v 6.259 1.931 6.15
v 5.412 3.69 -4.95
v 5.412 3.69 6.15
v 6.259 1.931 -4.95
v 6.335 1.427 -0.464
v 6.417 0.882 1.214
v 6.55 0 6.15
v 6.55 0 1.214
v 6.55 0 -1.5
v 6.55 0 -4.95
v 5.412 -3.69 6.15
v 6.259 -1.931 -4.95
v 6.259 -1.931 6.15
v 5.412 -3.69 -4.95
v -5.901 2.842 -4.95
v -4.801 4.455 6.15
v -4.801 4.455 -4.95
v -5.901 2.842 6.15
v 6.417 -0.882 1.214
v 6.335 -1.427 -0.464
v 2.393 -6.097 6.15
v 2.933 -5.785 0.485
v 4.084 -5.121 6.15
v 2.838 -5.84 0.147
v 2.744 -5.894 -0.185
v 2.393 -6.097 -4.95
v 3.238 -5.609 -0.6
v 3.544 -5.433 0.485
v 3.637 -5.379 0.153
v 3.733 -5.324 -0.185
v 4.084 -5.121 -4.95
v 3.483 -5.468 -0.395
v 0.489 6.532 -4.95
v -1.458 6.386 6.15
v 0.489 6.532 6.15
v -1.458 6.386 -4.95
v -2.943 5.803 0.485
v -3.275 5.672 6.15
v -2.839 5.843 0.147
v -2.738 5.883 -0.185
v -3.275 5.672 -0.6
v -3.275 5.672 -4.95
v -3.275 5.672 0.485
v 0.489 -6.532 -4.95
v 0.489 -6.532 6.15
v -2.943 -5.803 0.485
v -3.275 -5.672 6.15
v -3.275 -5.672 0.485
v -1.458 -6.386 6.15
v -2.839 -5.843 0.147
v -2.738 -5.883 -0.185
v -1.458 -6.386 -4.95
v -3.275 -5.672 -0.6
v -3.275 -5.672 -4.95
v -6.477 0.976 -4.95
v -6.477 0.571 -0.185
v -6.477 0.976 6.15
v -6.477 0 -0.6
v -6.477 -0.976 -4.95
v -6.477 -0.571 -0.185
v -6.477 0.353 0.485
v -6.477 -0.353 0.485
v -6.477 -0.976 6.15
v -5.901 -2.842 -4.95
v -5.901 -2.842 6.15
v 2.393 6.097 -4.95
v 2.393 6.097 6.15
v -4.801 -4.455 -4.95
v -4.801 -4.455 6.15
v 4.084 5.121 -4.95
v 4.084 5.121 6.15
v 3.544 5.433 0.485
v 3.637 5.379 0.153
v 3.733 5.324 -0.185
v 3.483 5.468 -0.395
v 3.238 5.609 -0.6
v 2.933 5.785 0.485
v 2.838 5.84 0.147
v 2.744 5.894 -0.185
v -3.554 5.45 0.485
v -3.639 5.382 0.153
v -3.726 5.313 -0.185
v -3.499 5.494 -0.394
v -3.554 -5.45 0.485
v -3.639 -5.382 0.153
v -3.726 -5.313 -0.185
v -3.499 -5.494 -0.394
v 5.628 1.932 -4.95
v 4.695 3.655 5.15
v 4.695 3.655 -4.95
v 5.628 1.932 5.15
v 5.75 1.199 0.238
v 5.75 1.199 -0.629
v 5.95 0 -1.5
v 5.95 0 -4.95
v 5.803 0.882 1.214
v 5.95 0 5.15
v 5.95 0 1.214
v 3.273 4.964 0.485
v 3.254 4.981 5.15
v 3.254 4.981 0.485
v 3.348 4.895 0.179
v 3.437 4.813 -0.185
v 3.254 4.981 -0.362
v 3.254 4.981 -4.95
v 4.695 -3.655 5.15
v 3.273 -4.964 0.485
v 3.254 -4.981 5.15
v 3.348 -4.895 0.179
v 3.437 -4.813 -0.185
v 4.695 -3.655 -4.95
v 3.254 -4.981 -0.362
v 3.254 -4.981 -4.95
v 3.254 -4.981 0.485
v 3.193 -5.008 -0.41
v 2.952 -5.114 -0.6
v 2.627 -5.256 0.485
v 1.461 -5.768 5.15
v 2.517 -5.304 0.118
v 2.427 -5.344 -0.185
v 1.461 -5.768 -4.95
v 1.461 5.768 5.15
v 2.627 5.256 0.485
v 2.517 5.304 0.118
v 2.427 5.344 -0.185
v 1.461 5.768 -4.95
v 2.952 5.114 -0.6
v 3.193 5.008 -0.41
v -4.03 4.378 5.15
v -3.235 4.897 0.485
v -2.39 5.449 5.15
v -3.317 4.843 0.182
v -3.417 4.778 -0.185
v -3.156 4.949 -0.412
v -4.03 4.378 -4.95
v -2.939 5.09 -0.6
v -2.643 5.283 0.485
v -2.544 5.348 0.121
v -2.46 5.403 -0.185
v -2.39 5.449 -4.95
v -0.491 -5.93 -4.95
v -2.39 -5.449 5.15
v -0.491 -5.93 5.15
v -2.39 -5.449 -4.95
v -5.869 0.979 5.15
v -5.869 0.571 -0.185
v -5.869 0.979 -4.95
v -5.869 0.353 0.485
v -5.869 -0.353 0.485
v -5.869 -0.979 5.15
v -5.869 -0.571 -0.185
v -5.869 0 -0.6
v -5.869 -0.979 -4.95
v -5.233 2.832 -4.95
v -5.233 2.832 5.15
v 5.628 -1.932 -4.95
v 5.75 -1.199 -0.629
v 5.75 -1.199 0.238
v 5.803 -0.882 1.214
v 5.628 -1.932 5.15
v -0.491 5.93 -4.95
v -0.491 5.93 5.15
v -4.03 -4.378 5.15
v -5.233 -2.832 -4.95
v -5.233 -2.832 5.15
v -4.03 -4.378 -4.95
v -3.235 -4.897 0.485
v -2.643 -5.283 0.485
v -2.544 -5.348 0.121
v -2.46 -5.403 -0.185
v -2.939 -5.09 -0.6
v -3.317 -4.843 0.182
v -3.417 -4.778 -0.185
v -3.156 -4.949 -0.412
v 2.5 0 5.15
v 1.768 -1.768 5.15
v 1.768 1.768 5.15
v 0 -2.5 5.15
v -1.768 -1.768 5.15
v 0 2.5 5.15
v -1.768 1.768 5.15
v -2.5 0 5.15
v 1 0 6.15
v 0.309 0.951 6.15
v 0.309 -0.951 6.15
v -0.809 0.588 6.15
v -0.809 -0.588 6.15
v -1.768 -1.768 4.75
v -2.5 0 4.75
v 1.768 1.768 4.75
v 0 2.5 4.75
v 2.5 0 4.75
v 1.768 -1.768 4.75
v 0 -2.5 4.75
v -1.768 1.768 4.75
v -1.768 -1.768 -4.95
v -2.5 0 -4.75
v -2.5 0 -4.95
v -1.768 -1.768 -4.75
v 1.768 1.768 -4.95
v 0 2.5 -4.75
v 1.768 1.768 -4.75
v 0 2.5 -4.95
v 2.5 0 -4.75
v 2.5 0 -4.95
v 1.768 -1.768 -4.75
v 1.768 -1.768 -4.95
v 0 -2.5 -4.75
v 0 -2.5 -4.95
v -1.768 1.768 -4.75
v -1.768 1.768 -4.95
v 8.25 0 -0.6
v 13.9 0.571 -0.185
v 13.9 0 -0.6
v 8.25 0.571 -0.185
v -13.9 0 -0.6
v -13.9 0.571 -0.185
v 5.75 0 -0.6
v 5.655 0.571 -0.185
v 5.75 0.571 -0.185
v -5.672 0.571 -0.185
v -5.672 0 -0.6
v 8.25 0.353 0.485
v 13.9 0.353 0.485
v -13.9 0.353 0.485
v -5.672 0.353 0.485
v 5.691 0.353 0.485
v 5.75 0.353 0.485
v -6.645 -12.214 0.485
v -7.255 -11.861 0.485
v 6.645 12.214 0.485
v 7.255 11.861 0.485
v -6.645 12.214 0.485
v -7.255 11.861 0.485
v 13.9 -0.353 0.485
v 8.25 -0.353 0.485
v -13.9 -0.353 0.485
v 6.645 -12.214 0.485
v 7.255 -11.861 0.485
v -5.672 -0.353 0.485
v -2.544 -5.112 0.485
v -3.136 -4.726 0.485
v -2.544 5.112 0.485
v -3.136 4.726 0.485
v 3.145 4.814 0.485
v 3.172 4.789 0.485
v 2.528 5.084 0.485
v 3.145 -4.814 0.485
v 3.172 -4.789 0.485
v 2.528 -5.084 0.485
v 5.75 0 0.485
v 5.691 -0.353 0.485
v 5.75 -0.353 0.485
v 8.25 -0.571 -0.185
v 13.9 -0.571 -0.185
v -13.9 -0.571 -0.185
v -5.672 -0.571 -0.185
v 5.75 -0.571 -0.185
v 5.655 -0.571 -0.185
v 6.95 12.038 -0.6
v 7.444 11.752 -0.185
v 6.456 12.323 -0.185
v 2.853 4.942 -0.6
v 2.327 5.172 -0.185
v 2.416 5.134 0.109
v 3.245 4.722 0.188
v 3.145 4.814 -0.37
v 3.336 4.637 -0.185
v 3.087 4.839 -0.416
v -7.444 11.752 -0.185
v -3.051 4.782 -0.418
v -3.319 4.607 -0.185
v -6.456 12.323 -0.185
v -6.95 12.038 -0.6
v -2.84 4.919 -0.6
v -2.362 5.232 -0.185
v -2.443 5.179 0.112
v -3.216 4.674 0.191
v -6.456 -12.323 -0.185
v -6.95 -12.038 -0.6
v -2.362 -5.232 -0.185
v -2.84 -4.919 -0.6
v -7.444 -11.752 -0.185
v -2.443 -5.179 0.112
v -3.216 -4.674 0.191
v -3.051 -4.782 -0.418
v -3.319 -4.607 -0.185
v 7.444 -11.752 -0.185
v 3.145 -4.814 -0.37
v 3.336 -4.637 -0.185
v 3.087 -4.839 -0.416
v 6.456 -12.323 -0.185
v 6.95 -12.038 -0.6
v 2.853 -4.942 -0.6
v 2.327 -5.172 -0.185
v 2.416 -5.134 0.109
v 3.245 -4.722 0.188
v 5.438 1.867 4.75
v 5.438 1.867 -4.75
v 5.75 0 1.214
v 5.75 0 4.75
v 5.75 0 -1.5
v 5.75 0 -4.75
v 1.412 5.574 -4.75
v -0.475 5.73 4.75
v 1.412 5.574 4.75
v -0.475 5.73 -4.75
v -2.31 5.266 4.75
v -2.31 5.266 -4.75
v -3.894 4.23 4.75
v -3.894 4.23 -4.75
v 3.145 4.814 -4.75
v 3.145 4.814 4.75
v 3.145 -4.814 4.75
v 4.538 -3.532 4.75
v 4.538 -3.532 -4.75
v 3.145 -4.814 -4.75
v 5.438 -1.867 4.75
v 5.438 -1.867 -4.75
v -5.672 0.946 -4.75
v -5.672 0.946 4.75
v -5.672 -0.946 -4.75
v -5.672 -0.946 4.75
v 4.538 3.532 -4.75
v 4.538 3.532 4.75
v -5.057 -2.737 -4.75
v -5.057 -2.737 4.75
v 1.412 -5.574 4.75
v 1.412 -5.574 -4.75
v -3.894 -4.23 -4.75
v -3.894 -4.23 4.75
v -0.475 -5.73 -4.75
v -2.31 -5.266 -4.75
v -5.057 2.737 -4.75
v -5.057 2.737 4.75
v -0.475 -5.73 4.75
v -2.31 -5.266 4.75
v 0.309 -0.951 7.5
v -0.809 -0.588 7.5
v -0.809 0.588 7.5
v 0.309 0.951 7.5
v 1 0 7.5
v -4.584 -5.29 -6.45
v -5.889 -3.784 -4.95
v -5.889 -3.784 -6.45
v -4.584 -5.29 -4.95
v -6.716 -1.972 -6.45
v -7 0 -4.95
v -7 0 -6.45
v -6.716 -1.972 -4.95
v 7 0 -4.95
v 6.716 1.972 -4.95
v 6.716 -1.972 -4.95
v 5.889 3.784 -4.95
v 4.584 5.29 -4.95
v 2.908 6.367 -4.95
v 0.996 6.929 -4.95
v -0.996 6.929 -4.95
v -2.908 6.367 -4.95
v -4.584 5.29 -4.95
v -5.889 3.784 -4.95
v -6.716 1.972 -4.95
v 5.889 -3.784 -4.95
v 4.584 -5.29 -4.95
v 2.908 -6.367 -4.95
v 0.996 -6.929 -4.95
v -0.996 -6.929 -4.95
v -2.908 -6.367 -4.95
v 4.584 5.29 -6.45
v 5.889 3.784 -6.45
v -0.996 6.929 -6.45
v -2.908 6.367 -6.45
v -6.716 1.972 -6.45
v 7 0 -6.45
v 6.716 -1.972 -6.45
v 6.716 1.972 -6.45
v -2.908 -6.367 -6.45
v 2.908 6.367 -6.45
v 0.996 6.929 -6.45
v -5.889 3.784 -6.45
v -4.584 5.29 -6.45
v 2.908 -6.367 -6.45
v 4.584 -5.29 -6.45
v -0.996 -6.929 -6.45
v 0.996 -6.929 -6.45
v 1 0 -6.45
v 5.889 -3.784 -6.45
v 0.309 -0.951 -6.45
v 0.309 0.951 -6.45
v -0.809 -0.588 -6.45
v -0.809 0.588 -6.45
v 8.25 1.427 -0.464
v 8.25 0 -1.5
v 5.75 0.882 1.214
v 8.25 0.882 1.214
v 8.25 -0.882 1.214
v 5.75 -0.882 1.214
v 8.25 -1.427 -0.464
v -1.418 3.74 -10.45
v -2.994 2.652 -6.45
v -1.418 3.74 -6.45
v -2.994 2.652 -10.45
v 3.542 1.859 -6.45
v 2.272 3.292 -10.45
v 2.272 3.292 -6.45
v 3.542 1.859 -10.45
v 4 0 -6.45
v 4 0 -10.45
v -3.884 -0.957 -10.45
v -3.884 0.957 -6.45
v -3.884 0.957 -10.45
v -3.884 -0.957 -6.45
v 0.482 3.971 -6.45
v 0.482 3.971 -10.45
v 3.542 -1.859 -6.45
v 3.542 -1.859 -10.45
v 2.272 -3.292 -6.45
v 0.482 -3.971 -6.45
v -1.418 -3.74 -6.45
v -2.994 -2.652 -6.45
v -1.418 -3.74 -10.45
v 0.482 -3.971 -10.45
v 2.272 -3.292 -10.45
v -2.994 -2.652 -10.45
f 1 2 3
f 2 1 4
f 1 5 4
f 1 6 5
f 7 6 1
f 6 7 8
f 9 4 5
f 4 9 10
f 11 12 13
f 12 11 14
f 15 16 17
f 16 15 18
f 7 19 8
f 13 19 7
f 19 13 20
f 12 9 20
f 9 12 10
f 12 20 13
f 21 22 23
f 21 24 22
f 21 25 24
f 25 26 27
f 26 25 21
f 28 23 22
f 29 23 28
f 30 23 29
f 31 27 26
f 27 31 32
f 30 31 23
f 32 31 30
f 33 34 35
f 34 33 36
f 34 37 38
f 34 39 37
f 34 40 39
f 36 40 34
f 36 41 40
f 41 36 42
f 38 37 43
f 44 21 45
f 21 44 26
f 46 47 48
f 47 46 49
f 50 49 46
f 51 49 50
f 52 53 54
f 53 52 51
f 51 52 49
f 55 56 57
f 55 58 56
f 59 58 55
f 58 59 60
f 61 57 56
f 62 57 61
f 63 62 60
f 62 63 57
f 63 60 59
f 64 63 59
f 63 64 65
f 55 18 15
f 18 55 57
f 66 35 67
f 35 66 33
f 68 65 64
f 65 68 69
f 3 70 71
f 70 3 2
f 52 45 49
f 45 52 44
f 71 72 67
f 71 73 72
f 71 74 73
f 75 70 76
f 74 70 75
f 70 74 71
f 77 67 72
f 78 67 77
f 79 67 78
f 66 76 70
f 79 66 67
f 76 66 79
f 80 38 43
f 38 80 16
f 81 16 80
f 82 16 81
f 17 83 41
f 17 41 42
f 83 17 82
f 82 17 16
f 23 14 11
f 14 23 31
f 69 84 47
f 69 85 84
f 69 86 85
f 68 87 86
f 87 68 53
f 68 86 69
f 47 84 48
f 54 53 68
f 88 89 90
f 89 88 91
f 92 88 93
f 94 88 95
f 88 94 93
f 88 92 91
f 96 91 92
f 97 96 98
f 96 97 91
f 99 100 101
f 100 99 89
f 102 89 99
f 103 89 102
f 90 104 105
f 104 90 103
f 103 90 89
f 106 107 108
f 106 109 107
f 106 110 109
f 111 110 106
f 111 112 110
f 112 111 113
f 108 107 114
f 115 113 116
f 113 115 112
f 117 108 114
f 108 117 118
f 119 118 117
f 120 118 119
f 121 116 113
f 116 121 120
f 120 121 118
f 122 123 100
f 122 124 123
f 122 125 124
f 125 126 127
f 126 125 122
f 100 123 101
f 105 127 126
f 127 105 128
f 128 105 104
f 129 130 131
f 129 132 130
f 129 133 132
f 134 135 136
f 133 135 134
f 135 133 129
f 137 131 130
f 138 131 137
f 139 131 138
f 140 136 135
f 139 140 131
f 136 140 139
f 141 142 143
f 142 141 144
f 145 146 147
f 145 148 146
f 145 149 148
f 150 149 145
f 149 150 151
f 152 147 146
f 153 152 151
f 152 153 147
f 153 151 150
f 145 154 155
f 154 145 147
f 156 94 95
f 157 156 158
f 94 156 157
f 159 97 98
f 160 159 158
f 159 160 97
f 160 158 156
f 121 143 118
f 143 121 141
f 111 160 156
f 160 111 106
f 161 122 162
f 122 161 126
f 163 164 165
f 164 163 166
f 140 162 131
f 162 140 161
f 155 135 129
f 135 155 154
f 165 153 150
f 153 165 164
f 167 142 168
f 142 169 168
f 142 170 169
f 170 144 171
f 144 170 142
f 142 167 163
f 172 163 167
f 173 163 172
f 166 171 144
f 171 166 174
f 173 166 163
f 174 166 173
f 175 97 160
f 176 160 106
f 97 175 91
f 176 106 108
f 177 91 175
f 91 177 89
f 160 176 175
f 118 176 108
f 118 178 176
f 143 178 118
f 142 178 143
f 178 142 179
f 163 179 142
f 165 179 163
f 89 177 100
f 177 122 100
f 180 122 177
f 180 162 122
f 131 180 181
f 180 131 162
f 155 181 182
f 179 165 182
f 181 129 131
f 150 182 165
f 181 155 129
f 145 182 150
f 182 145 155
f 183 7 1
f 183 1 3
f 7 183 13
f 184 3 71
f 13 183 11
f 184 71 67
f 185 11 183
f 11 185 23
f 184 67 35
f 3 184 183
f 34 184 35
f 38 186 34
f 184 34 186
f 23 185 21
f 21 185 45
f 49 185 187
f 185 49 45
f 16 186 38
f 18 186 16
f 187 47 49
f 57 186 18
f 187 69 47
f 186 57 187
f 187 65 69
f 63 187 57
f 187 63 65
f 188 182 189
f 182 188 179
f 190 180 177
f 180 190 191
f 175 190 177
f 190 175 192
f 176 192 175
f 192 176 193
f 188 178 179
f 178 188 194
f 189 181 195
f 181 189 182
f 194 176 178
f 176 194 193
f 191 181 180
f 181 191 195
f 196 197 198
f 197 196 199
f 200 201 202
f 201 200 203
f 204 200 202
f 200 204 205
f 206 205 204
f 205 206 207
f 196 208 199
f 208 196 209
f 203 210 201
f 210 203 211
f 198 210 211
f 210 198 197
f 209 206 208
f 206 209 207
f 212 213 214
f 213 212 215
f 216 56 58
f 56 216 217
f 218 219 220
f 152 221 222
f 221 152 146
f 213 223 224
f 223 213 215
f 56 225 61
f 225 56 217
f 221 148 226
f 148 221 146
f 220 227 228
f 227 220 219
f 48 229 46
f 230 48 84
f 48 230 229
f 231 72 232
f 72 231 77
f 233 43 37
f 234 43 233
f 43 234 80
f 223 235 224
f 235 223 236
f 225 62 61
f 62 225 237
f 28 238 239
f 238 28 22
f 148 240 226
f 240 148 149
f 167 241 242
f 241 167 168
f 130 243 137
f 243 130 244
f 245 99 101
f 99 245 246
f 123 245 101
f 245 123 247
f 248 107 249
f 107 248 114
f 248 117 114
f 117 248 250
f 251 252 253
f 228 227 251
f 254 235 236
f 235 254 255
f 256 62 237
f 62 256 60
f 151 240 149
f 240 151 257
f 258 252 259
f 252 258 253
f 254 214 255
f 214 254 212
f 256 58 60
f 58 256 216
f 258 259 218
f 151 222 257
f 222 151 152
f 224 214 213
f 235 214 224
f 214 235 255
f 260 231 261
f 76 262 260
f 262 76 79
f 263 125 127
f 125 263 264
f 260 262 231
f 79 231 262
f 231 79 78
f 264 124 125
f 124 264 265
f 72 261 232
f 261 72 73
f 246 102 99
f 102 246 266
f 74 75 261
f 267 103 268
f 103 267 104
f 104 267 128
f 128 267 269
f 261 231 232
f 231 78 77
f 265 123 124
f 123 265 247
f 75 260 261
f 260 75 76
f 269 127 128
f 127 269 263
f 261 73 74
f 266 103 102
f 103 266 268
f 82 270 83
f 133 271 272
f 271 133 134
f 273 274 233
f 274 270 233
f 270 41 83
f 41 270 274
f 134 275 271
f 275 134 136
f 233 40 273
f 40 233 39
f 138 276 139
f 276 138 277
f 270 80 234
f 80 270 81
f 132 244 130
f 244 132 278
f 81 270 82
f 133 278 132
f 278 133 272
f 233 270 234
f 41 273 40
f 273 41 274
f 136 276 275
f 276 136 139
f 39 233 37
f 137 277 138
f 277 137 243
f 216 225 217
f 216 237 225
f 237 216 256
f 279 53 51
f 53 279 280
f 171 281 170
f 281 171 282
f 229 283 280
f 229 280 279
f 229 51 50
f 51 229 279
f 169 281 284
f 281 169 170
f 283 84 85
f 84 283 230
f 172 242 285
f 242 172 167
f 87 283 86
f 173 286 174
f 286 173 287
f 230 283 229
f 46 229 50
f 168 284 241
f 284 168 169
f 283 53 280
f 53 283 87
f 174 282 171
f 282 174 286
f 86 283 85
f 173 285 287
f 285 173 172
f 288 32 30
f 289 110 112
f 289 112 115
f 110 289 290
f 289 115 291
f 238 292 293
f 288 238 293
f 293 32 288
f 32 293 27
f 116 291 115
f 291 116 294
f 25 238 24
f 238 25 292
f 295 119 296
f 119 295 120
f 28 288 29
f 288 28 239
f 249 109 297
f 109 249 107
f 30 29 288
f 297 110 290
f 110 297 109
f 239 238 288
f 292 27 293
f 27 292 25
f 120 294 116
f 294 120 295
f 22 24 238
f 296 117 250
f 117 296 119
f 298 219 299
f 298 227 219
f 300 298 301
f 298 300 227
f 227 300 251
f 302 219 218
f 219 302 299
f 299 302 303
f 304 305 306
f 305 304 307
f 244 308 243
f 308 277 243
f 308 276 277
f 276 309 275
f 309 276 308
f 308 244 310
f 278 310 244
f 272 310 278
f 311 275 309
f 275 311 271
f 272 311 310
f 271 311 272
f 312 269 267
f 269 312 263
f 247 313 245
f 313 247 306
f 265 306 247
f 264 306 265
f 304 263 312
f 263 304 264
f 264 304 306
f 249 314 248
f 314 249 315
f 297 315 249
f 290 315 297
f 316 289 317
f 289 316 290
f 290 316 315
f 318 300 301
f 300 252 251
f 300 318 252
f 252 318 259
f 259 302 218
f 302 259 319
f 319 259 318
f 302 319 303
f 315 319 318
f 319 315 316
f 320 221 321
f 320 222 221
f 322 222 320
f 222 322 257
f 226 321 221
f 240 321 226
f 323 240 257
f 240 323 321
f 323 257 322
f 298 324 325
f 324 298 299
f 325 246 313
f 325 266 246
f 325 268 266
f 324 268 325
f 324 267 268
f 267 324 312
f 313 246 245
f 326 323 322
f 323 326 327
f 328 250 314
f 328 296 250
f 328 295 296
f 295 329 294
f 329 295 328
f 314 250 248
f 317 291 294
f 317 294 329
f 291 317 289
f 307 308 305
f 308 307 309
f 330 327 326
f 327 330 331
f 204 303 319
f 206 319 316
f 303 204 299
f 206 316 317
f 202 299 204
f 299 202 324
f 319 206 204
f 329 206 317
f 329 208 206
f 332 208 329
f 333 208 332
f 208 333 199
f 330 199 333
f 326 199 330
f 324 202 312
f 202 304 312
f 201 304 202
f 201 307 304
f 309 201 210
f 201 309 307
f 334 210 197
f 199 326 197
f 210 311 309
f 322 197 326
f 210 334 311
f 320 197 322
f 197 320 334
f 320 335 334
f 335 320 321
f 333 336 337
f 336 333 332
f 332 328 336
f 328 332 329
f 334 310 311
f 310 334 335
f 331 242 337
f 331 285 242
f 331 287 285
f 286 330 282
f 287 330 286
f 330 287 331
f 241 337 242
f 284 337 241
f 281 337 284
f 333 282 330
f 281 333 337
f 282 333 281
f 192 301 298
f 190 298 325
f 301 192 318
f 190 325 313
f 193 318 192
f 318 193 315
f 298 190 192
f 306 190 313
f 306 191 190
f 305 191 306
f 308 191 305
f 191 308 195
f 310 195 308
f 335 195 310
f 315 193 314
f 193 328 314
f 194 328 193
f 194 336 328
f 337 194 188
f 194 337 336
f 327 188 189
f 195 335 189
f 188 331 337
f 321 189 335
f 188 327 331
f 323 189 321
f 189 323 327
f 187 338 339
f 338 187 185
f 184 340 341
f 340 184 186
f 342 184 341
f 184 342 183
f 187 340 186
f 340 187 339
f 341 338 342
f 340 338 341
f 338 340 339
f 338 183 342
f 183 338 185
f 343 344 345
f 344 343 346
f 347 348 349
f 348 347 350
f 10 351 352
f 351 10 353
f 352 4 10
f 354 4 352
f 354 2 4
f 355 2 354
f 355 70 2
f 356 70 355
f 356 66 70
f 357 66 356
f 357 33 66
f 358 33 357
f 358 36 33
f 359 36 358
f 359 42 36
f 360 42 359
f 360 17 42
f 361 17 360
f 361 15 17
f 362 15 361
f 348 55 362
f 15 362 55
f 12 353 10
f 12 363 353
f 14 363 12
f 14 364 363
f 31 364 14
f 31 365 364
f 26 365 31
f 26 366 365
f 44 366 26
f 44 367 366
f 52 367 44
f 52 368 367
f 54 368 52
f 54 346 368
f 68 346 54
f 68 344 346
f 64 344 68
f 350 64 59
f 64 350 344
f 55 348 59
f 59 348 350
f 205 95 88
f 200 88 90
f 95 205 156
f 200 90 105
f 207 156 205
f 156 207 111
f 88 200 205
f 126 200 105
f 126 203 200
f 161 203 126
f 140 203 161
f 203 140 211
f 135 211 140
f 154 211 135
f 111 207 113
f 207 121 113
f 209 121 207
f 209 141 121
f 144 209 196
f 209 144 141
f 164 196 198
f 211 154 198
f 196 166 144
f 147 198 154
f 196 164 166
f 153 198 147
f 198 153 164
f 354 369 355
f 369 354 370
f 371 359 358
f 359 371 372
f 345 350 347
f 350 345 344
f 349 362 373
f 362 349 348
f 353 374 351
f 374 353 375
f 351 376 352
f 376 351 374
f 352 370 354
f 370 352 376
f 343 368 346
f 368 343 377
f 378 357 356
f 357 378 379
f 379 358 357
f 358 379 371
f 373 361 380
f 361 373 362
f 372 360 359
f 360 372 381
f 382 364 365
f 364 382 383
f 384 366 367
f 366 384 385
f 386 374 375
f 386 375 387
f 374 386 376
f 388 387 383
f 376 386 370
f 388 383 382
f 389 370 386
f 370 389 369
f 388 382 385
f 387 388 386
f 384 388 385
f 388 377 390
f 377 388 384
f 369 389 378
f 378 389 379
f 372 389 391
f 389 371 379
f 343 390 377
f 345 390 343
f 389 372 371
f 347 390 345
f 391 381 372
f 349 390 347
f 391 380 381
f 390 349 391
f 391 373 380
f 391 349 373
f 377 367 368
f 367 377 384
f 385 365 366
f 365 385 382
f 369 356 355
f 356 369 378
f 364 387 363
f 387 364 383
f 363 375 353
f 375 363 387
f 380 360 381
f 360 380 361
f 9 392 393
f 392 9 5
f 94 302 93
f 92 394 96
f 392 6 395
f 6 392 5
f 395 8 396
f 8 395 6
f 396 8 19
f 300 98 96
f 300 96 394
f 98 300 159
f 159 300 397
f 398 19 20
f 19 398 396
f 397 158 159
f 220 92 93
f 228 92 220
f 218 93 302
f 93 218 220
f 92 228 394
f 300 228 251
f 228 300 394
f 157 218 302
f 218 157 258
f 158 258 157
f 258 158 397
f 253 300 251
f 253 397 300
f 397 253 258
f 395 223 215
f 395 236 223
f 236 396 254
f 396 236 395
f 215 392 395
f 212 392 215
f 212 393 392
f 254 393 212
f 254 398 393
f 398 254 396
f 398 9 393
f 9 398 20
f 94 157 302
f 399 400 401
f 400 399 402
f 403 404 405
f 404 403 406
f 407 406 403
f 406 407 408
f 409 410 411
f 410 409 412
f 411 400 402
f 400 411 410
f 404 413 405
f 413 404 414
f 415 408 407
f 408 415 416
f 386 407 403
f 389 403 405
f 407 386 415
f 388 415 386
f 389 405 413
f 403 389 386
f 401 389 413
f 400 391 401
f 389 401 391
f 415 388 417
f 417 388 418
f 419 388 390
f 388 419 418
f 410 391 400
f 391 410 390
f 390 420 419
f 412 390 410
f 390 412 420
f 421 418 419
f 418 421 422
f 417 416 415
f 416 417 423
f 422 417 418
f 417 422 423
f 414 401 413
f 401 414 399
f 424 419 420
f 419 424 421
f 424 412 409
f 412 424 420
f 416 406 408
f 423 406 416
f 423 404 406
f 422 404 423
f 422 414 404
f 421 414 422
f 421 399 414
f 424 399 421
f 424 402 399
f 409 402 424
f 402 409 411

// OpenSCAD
// Parameters
stator_diameter_mm = 11.5; //[6:23:0.1]
stator_height_mm = 9.5; //[5:19:0.1]
housing_wall_thickness_mm = 0.6; //[0.3:1.2:0.05]
housing_clearance_mm = 0.2; //[0.1:0.6:0.05]
shaft_diameter_mm = 2; //[1:4:0.05]
shaft_length_mm = 15; //[8:30:0.5]
endcap_thickness_mm = 1; //[0.5:2:0.05]
bearing_outer_diameter_mm = 5; //[3:10:0.1]
bearing_thickness_mm = 2; //[1:4:0.1]
flange_diameter_mm = 14; //[8:28:0.1]
flange_thickness_mm = 1.5; //[0.8:3:0.1]
overlap_mm = 0.8; //[0.5:2:0.1]
housing_extra_height_mm = 2; //[0.5:6:0.1]
wire_grommet_diameter_mm = 3; //[1.5:6:0.1]
wire_grommet_length_mm = 2.5; //[1:6:0.1]
vent_hole_diameter_mm = 1.2; //[0.6:2.5:0.1]
vent_hole_count = 6; //[3:12:1]
buzzer_diameter_mm = 8; //[4:16:0.1]
buzzer_height_mm = 4; //[2:10:0.1]
buzzer_pin_diameter_mm = 2; //[1:3:0.1]
buzzer_pin_height_mm = 2; //[0.5:6:0.1]

// Buzzer - complete geometry
module buzzer() {
  color("Black") {
    // Buzzer body
    cylinder(r=buzzer_diameter_mm/2, h=buzzer_height_mm, center=true);
    // Buzzer pin
    translate([0, 0, buzzer_height_mm/2 - buzzer_pin_height_mm/2])
      cylinder(r=buzzer_pin_diameter_mm/2, h=buzzer_pin_height_mm, center=true);
  }
}

// Motor assembly
module assembly() {
  color("DimGray") {
    // Stator core
    translate([0, 0, 0])
      cylinder(r=stator_diameter_mm/2, h=stator_height_mm, center=true);

    // Housing can
    difference() {
      cylinder(r=stator_diameter_mm/2 + housing_clearance_mm + housing_wall_thickness_mm, 
               h=stator_height_mm + housing_extra_height_mm, center=true);
      cylinder(r=stator_diameter_mm/2 + housing_clearance_mm, 
               h=stator_height_mm + housing_extra_height_mm + 2*overlap_mm, center=true);
    }

    // Central shaft
    translate([0, 0, 0])
      cylinder(r=shaft_diameter_mm/2, h=shaft_length_mm, center=true);

    // End caps
    union() {
      translate([0, 0, (stator_height_mm + housing_extra_height_mm)/2 - endcap_thickness_mm/2 + overlap_mm/2])
        cylinder(r=stator_diameter_mm/2 + housing_clearance_mm + housing_wall_thickness_mm, 
                 h=endcap_thickness_mm, center=true);
      translate([0, 0, -(stator_height_mm + housing_extra_height_mm)/2 + endcap_thickness_mm/2 - overlap_mm/2])
        cylinder(r=stator_diameter_mm/2 + housing_clearance_mm + housing_wall_thickness_mm, 
                 h=endcap_thickness_mm, center=true);
    }

    // Bearing seats
    union() {
      translate([0, 0, (stator_height_mm + housing_extra_height_mm)/2 - endcap_thickness_mm - bearing_thickness_mm/2 + overlap_mm])
        cylinder(r=bearing_outer_diameter_mm/2, h=bearing_thickness_mm, center=true);
      translate([0, 0, -(stator_height_mm + housing_extra_height_mm)/2 + endcap_thickness_mm + bearing_thickness_mm/2 - overlap_mm])
        cylinder(r=bearing_outer_diameter_mm/2, h=bearing_thickness_mm, center=true);
    }

    // Mounting flange
    translate([0, 0, -(stator_height_mm + housing_extra_height_mm)/2 - flange_thickness_mm/2 + overlap_mm])
      cylinder(r=flange_diameter_mm/2, h=flange_thickness_mm, center=true);

    // Wire exit grommet
    translate([stator_diameter_mm/2 + housing_clearance_mm + housing_wall_thickness_mm + wire_grommet_length_mm/2 - overlap_mm, 0, 0])
      rotate([0, 90, 0])
      cylinder(r=wire_grommet_diameter_mm/2, h=wire_grommet_length_mm, center=true);

    // Vent holes
    for (i = [0:vent_hole_count-1]) {
      rotate([0, 0, i*360/vent_hole_count])
        translate([stator_diameter_mm/2 + housing_clearance_mm + housing_wall_thickness_mm, 0, 0])
        rotate([0, 90, 0])
        cylinder(r=vent_hole_diameter_mm/2, 
                 h=2*(stator_diameter_mm/2 + housing_clearance_mm + housing_wall_thickness_mm) + 2*overlap_mm, 
                 center=true);
    }
  }

  // Buzzer
  translate([0, 0, -(stator_height_mm + housing_extra_height_mm)/2 - flange_thickness_mm - buzzer_height_mm/2 + overlap_mm])
    buzzer();
}

// Final assembly
assembly();
